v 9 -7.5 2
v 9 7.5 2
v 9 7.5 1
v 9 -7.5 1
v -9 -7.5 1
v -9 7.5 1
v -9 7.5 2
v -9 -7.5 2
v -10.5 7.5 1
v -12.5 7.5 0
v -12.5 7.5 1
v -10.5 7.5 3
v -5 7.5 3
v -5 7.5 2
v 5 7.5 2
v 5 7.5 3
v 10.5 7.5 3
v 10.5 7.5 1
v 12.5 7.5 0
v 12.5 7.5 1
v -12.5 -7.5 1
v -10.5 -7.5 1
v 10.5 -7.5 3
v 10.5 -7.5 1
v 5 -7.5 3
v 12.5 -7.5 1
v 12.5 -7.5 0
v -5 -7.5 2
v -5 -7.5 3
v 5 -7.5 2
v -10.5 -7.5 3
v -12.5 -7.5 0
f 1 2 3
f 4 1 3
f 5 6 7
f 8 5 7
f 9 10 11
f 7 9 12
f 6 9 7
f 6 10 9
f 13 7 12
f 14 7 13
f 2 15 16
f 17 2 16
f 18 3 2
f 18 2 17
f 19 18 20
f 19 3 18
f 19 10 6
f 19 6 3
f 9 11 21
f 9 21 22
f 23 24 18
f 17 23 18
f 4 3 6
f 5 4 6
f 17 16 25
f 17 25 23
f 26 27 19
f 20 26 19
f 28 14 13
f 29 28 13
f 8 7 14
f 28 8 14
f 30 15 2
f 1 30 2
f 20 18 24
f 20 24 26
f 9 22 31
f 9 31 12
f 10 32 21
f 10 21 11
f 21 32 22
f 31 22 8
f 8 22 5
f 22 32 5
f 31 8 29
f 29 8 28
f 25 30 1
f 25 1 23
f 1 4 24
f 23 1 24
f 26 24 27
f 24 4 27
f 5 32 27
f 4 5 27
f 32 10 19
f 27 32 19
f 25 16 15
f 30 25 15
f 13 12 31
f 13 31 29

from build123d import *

# Parameters (mm, degrees)
SKETCH1_W               = 25
SKETCH1_H               = 15
BOSS_EXTRUDE1_DEPTH     = 1
SKETCH2_W               = 21
SKETCH2_H               = 15
BOSS_EXTRUDE2_DEPTH     = 3
CUT_EXTRUDE1_DEPTH      = 8.5
CUT_EXTRUDE1_DEPTH_BACK = 8.5


with BuildPart() as part:
    # Sketch1 → Boss-Extrude1 (new body)
    with BuildSketch(Plane.XY):
        Rectangle(SKETCH1_W, SKETCH1_H)
    extrude(amount=BOSS_EXTRUDE1_DEPTH)

    # Sketch2 → Boss-Extrude2 (add)
    with BuildSketch(Plane.XY):
        Rectangle(SKETCH2_W, SKETCH2_H)
    extrude(amount=BOSS_EXTRUDE2_DEPTH)

    # Sketch3 → Cut-Extrude1 (cut, two sides)
    with BuildSketch(Plane(origin=(0, 0, 0), x_dir=(1, 0, 0), z_dir=(0, 1, 0))) as cut_extrude1_sk:
        Polygon((-9, -2), (-5, -2), (-5, -3), (5, -3), (5, -2), (9, -2), (9, -1), (-9, -1), align=None)
    extrude(amount=CUT_EXTRUDE1_DEPTH, mode=Mode.SUBTRACT)
    extrude(cut_extrude1_sk.sketch, amount=-CUT_EXTRUDE1_DEPTH_BACK, mode=Mode.SUBTRACT)


solid = part.part
